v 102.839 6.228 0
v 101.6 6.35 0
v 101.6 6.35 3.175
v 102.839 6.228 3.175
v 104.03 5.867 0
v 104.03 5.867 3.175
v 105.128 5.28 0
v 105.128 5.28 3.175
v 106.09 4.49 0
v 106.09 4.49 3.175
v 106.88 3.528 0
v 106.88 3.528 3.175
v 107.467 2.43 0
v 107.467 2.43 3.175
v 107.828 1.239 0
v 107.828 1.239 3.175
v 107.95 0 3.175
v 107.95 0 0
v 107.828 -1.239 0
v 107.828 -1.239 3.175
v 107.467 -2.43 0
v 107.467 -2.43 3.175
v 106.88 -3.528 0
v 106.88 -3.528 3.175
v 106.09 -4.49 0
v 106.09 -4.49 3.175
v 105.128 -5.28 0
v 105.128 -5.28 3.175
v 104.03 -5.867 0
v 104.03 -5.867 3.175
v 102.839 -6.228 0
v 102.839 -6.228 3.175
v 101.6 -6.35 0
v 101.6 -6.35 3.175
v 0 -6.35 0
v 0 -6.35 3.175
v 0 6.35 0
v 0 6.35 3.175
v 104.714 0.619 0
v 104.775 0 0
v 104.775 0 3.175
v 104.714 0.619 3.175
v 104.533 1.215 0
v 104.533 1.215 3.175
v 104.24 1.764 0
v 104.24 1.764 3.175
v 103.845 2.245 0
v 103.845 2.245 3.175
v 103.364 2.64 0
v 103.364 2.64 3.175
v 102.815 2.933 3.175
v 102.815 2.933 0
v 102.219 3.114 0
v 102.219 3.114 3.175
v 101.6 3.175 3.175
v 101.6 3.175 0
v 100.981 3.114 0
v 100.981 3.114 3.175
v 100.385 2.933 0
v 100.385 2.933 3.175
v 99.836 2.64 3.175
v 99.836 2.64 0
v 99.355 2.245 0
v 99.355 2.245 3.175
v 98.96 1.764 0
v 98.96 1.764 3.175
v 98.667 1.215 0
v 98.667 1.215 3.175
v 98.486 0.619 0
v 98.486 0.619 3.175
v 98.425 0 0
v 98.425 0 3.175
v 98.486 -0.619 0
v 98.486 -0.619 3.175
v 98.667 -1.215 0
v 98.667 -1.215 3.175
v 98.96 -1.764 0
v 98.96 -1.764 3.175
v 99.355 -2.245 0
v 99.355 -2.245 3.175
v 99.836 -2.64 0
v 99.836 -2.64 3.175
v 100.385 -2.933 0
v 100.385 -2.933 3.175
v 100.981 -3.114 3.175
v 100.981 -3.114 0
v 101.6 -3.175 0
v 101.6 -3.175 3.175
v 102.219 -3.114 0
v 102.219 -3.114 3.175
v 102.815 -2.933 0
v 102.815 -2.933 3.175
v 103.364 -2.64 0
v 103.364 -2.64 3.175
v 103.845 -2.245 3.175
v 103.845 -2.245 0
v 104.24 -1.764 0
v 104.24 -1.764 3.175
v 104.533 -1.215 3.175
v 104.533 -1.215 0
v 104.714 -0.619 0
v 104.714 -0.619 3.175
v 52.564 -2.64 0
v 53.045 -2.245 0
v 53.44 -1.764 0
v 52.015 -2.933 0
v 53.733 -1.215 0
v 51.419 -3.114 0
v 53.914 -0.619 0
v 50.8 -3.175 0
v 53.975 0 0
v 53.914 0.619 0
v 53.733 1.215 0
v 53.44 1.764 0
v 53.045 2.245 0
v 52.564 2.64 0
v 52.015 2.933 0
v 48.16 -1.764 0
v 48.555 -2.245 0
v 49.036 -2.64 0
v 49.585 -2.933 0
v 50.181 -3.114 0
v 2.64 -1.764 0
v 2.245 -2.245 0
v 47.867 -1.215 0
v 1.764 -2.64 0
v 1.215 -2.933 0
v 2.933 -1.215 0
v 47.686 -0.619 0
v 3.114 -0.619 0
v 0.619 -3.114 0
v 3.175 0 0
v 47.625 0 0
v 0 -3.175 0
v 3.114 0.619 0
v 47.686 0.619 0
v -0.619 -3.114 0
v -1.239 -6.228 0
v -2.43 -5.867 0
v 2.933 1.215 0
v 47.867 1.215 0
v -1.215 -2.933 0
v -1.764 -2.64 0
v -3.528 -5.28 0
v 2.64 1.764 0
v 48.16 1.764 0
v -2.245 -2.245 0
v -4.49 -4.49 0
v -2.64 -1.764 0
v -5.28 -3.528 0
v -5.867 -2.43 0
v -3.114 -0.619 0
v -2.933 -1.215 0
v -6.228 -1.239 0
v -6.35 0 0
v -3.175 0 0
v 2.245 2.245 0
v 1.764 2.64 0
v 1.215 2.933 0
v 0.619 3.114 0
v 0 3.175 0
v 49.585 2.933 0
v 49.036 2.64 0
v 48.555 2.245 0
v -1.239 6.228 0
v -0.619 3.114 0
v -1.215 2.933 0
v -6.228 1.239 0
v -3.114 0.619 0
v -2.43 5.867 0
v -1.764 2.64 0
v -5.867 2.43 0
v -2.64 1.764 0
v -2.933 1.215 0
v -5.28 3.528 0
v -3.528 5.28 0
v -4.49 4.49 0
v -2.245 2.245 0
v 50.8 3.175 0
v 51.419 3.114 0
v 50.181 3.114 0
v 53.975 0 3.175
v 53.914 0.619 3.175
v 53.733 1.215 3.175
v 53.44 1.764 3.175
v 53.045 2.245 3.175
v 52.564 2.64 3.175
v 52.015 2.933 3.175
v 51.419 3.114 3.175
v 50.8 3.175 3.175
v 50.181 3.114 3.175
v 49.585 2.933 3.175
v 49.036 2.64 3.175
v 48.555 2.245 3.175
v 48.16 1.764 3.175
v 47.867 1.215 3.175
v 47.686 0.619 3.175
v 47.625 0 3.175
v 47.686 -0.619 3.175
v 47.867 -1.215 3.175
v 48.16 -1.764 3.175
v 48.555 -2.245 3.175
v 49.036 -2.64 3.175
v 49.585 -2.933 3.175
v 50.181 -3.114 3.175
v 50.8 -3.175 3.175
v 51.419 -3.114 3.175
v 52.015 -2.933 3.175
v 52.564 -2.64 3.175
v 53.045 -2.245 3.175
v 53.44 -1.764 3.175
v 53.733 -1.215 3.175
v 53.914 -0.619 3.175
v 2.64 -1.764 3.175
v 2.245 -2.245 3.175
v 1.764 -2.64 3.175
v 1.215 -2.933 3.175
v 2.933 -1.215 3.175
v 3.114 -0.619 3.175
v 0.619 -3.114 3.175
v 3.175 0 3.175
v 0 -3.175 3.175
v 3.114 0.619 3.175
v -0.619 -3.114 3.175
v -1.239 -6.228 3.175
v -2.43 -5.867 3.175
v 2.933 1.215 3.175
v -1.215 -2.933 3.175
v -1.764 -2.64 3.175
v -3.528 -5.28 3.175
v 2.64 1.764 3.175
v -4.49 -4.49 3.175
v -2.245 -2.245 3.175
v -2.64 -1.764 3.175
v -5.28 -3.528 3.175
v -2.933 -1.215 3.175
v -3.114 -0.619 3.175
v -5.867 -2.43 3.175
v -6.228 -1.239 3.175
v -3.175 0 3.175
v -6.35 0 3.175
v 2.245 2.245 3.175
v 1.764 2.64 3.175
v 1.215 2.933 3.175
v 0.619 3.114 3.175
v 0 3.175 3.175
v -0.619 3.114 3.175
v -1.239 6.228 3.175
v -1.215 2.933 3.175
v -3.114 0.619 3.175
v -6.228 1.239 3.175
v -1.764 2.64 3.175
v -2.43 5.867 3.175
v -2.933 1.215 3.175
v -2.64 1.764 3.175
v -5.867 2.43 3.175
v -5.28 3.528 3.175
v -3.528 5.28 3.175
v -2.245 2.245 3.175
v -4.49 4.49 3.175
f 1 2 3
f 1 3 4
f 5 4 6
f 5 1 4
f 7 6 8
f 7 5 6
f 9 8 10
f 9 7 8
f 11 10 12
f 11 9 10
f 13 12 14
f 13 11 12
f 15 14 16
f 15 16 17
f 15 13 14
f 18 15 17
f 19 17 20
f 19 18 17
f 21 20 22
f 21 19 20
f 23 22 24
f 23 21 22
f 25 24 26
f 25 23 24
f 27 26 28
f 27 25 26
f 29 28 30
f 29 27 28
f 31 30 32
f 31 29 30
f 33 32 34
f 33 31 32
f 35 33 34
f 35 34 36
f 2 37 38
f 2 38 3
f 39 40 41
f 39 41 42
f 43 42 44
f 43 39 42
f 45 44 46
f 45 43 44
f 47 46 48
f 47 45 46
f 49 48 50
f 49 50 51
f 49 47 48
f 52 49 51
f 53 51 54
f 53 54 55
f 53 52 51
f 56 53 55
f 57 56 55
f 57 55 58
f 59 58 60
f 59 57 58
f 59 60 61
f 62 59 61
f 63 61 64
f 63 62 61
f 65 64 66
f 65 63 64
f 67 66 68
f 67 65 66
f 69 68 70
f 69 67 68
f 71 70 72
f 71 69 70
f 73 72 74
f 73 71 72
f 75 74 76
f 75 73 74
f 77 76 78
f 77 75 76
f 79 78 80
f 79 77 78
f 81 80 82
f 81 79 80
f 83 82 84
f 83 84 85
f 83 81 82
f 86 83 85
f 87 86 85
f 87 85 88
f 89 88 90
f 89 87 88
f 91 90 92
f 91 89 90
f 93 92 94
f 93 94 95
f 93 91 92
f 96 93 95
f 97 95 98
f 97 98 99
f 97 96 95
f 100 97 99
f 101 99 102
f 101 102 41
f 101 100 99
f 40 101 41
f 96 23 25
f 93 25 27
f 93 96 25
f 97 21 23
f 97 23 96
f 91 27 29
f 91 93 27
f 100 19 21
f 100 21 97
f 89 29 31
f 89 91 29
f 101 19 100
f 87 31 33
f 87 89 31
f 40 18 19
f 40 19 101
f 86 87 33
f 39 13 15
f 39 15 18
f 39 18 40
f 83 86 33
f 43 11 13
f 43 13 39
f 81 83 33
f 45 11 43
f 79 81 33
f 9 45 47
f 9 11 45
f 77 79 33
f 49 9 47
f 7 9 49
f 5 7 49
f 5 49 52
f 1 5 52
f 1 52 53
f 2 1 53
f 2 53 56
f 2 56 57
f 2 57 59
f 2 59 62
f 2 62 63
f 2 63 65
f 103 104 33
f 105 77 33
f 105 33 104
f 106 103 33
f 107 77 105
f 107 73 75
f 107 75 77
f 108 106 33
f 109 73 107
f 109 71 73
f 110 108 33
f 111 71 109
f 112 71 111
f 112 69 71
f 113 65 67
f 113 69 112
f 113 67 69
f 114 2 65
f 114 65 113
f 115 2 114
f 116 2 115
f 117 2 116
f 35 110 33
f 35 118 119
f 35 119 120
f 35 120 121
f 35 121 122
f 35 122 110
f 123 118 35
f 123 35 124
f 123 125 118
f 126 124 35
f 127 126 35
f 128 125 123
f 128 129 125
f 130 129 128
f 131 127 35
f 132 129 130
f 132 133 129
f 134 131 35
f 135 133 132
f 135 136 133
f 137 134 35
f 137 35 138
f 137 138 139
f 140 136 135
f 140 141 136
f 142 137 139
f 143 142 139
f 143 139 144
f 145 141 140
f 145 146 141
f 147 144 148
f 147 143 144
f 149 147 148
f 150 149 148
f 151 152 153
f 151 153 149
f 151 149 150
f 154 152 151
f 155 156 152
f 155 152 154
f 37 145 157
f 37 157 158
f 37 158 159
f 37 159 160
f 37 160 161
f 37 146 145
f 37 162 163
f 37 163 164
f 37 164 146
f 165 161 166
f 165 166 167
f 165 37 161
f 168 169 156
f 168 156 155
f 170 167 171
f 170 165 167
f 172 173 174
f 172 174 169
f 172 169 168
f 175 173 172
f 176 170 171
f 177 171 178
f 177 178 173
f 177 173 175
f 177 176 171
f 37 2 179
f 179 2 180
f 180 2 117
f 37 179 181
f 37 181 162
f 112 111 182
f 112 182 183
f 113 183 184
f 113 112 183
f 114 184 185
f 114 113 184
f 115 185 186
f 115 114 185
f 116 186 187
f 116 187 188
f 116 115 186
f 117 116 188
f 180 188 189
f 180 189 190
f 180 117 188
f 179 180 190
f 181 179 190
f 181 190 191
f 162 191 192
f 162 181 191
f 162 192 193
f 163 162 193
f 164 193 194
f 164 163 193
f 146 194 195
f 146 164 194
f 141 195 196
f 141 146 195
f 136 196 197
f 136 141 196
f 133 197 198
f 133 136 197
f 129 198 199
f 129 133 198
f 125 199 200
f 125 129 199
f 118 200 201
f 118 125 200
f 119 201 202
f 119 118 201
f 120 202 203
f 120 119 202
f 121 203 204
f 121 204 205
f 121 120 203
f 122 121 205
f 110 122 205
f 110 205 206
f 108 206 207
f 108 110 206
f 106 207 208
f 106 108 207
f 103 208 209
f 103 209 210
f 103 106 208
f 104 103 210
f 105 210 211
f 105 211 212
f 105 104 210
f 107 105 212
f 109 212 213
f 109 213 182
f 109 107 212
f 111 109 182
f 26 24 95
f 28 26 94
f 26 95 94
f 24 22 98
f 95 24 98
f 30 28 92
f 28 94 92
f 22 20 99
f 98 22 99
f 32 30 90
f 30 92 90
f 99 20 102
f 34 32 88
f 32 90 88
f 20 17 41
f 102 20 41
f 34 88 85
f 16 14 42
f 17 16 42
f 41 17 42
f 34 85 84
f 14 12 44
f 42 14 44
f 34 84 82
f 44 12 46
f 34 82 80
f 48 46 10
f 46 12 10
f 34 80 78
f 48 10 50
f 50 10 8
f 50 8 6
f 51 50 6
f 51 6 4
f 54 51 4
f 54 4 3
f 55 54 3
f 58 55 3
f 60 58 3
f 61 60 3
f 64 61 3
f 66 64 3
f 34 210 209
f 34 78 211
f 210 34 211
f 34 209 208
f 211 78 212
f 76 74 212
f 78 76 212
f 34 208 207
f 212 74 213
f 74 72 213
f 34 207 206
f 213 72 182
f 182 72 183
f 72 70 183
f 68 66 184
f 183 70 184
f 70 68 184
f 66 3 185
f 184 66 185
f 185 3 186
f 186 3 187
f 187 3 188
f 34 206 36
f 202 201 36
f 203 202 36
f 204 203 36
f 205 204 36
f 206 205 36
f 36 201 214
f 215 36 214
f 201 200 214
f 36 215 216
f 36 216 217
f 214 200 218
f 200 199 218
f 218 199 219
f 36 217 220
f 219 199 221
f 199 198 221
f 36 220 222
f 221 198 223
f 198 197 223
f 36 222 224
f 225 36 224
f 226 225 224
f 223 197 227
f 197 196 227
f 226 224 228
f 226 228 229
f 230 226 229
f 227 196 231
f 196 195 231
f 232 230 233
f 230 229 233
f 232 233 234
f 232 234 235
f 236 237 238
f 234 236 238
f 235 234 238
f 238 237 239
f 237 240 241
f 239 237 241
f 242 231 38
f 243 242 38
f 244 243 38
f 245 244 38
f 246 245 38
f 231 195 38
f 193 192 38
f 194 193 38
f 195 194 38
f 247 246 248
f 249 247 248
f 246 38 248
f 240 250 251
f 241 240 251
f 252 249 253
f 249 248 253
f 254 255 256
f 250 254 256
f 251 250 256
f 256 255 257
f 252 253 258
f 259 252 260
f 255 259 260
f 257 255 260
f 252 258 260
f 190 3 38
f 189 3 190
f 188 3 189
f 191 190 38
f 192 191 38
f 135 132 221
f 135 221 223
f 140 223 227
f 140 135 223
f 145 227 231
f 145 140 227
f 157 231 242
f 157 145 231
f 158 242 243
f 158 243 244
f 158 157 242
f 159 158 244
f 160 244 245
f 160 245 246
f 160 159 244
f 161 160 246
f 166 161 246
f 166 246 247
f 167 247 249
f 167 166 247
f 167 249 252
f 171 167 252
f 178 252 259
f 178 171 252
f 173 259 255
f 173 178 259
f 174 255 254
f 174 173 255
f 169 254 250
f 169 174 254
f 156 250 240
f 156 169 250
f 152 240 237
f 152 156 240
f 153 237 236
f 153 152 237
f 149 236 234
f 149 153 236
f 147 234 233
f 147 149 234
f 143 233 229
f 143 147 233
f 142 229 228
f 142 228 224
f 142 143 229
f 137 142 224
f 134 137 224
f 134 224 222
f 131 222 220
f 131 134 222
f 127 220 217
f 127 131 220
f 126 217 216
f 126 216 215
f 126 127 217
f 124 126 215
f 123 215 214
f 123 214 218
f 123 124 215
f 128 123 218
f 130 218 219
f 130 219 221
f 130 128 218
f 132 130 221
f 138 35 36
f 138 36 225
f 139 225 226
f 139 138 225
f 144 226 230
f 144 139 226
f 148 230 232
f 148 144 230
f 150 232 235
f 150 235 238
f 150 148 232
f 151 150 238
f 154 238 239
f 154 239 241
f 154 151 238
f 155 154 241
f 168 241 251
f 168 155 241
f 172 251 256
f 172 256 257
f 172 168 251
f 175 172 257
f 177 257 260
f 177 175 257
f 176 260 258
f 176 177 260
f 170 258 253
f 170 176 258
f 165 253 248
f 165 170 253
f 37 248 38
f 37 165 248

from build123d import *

# Parameters (mm, degrees)
SKETCH1_R           = 3.175
BOSS_EXTRUDE1_DEPTH = 3.175


with BuildPart() as part:
    # Sketch1 → Boss-Extrude1 (new body)
    with BuildSketch(Plane.XY):
        with BuildLine():
            Line((0, 6.35), (101.6, 6.35))
            ThreePointArc((101.6, 6.35), (107.95, 0), (101.6, -6.35))
            Line((101.6, -6.35), (0, -6.35))
            ThreePointArc((0, -6.35), (-6.35, 0), (0, 6.35))
        make_face()
        Circle(SKETCH1_R, mode=Mode.SUBTRACT)
        with Locations((101.6, 0)):
            Circle(SKETCH1_R, mode=Mode.SUBTRACT)
        with Locations((50.8, 0)):
            Circle(SKETCH1_R, mode=Mode.SUBTRACT)
    extrude(amount=BOSS_EXTRUDE1_DEPTH)


solid = part.part
